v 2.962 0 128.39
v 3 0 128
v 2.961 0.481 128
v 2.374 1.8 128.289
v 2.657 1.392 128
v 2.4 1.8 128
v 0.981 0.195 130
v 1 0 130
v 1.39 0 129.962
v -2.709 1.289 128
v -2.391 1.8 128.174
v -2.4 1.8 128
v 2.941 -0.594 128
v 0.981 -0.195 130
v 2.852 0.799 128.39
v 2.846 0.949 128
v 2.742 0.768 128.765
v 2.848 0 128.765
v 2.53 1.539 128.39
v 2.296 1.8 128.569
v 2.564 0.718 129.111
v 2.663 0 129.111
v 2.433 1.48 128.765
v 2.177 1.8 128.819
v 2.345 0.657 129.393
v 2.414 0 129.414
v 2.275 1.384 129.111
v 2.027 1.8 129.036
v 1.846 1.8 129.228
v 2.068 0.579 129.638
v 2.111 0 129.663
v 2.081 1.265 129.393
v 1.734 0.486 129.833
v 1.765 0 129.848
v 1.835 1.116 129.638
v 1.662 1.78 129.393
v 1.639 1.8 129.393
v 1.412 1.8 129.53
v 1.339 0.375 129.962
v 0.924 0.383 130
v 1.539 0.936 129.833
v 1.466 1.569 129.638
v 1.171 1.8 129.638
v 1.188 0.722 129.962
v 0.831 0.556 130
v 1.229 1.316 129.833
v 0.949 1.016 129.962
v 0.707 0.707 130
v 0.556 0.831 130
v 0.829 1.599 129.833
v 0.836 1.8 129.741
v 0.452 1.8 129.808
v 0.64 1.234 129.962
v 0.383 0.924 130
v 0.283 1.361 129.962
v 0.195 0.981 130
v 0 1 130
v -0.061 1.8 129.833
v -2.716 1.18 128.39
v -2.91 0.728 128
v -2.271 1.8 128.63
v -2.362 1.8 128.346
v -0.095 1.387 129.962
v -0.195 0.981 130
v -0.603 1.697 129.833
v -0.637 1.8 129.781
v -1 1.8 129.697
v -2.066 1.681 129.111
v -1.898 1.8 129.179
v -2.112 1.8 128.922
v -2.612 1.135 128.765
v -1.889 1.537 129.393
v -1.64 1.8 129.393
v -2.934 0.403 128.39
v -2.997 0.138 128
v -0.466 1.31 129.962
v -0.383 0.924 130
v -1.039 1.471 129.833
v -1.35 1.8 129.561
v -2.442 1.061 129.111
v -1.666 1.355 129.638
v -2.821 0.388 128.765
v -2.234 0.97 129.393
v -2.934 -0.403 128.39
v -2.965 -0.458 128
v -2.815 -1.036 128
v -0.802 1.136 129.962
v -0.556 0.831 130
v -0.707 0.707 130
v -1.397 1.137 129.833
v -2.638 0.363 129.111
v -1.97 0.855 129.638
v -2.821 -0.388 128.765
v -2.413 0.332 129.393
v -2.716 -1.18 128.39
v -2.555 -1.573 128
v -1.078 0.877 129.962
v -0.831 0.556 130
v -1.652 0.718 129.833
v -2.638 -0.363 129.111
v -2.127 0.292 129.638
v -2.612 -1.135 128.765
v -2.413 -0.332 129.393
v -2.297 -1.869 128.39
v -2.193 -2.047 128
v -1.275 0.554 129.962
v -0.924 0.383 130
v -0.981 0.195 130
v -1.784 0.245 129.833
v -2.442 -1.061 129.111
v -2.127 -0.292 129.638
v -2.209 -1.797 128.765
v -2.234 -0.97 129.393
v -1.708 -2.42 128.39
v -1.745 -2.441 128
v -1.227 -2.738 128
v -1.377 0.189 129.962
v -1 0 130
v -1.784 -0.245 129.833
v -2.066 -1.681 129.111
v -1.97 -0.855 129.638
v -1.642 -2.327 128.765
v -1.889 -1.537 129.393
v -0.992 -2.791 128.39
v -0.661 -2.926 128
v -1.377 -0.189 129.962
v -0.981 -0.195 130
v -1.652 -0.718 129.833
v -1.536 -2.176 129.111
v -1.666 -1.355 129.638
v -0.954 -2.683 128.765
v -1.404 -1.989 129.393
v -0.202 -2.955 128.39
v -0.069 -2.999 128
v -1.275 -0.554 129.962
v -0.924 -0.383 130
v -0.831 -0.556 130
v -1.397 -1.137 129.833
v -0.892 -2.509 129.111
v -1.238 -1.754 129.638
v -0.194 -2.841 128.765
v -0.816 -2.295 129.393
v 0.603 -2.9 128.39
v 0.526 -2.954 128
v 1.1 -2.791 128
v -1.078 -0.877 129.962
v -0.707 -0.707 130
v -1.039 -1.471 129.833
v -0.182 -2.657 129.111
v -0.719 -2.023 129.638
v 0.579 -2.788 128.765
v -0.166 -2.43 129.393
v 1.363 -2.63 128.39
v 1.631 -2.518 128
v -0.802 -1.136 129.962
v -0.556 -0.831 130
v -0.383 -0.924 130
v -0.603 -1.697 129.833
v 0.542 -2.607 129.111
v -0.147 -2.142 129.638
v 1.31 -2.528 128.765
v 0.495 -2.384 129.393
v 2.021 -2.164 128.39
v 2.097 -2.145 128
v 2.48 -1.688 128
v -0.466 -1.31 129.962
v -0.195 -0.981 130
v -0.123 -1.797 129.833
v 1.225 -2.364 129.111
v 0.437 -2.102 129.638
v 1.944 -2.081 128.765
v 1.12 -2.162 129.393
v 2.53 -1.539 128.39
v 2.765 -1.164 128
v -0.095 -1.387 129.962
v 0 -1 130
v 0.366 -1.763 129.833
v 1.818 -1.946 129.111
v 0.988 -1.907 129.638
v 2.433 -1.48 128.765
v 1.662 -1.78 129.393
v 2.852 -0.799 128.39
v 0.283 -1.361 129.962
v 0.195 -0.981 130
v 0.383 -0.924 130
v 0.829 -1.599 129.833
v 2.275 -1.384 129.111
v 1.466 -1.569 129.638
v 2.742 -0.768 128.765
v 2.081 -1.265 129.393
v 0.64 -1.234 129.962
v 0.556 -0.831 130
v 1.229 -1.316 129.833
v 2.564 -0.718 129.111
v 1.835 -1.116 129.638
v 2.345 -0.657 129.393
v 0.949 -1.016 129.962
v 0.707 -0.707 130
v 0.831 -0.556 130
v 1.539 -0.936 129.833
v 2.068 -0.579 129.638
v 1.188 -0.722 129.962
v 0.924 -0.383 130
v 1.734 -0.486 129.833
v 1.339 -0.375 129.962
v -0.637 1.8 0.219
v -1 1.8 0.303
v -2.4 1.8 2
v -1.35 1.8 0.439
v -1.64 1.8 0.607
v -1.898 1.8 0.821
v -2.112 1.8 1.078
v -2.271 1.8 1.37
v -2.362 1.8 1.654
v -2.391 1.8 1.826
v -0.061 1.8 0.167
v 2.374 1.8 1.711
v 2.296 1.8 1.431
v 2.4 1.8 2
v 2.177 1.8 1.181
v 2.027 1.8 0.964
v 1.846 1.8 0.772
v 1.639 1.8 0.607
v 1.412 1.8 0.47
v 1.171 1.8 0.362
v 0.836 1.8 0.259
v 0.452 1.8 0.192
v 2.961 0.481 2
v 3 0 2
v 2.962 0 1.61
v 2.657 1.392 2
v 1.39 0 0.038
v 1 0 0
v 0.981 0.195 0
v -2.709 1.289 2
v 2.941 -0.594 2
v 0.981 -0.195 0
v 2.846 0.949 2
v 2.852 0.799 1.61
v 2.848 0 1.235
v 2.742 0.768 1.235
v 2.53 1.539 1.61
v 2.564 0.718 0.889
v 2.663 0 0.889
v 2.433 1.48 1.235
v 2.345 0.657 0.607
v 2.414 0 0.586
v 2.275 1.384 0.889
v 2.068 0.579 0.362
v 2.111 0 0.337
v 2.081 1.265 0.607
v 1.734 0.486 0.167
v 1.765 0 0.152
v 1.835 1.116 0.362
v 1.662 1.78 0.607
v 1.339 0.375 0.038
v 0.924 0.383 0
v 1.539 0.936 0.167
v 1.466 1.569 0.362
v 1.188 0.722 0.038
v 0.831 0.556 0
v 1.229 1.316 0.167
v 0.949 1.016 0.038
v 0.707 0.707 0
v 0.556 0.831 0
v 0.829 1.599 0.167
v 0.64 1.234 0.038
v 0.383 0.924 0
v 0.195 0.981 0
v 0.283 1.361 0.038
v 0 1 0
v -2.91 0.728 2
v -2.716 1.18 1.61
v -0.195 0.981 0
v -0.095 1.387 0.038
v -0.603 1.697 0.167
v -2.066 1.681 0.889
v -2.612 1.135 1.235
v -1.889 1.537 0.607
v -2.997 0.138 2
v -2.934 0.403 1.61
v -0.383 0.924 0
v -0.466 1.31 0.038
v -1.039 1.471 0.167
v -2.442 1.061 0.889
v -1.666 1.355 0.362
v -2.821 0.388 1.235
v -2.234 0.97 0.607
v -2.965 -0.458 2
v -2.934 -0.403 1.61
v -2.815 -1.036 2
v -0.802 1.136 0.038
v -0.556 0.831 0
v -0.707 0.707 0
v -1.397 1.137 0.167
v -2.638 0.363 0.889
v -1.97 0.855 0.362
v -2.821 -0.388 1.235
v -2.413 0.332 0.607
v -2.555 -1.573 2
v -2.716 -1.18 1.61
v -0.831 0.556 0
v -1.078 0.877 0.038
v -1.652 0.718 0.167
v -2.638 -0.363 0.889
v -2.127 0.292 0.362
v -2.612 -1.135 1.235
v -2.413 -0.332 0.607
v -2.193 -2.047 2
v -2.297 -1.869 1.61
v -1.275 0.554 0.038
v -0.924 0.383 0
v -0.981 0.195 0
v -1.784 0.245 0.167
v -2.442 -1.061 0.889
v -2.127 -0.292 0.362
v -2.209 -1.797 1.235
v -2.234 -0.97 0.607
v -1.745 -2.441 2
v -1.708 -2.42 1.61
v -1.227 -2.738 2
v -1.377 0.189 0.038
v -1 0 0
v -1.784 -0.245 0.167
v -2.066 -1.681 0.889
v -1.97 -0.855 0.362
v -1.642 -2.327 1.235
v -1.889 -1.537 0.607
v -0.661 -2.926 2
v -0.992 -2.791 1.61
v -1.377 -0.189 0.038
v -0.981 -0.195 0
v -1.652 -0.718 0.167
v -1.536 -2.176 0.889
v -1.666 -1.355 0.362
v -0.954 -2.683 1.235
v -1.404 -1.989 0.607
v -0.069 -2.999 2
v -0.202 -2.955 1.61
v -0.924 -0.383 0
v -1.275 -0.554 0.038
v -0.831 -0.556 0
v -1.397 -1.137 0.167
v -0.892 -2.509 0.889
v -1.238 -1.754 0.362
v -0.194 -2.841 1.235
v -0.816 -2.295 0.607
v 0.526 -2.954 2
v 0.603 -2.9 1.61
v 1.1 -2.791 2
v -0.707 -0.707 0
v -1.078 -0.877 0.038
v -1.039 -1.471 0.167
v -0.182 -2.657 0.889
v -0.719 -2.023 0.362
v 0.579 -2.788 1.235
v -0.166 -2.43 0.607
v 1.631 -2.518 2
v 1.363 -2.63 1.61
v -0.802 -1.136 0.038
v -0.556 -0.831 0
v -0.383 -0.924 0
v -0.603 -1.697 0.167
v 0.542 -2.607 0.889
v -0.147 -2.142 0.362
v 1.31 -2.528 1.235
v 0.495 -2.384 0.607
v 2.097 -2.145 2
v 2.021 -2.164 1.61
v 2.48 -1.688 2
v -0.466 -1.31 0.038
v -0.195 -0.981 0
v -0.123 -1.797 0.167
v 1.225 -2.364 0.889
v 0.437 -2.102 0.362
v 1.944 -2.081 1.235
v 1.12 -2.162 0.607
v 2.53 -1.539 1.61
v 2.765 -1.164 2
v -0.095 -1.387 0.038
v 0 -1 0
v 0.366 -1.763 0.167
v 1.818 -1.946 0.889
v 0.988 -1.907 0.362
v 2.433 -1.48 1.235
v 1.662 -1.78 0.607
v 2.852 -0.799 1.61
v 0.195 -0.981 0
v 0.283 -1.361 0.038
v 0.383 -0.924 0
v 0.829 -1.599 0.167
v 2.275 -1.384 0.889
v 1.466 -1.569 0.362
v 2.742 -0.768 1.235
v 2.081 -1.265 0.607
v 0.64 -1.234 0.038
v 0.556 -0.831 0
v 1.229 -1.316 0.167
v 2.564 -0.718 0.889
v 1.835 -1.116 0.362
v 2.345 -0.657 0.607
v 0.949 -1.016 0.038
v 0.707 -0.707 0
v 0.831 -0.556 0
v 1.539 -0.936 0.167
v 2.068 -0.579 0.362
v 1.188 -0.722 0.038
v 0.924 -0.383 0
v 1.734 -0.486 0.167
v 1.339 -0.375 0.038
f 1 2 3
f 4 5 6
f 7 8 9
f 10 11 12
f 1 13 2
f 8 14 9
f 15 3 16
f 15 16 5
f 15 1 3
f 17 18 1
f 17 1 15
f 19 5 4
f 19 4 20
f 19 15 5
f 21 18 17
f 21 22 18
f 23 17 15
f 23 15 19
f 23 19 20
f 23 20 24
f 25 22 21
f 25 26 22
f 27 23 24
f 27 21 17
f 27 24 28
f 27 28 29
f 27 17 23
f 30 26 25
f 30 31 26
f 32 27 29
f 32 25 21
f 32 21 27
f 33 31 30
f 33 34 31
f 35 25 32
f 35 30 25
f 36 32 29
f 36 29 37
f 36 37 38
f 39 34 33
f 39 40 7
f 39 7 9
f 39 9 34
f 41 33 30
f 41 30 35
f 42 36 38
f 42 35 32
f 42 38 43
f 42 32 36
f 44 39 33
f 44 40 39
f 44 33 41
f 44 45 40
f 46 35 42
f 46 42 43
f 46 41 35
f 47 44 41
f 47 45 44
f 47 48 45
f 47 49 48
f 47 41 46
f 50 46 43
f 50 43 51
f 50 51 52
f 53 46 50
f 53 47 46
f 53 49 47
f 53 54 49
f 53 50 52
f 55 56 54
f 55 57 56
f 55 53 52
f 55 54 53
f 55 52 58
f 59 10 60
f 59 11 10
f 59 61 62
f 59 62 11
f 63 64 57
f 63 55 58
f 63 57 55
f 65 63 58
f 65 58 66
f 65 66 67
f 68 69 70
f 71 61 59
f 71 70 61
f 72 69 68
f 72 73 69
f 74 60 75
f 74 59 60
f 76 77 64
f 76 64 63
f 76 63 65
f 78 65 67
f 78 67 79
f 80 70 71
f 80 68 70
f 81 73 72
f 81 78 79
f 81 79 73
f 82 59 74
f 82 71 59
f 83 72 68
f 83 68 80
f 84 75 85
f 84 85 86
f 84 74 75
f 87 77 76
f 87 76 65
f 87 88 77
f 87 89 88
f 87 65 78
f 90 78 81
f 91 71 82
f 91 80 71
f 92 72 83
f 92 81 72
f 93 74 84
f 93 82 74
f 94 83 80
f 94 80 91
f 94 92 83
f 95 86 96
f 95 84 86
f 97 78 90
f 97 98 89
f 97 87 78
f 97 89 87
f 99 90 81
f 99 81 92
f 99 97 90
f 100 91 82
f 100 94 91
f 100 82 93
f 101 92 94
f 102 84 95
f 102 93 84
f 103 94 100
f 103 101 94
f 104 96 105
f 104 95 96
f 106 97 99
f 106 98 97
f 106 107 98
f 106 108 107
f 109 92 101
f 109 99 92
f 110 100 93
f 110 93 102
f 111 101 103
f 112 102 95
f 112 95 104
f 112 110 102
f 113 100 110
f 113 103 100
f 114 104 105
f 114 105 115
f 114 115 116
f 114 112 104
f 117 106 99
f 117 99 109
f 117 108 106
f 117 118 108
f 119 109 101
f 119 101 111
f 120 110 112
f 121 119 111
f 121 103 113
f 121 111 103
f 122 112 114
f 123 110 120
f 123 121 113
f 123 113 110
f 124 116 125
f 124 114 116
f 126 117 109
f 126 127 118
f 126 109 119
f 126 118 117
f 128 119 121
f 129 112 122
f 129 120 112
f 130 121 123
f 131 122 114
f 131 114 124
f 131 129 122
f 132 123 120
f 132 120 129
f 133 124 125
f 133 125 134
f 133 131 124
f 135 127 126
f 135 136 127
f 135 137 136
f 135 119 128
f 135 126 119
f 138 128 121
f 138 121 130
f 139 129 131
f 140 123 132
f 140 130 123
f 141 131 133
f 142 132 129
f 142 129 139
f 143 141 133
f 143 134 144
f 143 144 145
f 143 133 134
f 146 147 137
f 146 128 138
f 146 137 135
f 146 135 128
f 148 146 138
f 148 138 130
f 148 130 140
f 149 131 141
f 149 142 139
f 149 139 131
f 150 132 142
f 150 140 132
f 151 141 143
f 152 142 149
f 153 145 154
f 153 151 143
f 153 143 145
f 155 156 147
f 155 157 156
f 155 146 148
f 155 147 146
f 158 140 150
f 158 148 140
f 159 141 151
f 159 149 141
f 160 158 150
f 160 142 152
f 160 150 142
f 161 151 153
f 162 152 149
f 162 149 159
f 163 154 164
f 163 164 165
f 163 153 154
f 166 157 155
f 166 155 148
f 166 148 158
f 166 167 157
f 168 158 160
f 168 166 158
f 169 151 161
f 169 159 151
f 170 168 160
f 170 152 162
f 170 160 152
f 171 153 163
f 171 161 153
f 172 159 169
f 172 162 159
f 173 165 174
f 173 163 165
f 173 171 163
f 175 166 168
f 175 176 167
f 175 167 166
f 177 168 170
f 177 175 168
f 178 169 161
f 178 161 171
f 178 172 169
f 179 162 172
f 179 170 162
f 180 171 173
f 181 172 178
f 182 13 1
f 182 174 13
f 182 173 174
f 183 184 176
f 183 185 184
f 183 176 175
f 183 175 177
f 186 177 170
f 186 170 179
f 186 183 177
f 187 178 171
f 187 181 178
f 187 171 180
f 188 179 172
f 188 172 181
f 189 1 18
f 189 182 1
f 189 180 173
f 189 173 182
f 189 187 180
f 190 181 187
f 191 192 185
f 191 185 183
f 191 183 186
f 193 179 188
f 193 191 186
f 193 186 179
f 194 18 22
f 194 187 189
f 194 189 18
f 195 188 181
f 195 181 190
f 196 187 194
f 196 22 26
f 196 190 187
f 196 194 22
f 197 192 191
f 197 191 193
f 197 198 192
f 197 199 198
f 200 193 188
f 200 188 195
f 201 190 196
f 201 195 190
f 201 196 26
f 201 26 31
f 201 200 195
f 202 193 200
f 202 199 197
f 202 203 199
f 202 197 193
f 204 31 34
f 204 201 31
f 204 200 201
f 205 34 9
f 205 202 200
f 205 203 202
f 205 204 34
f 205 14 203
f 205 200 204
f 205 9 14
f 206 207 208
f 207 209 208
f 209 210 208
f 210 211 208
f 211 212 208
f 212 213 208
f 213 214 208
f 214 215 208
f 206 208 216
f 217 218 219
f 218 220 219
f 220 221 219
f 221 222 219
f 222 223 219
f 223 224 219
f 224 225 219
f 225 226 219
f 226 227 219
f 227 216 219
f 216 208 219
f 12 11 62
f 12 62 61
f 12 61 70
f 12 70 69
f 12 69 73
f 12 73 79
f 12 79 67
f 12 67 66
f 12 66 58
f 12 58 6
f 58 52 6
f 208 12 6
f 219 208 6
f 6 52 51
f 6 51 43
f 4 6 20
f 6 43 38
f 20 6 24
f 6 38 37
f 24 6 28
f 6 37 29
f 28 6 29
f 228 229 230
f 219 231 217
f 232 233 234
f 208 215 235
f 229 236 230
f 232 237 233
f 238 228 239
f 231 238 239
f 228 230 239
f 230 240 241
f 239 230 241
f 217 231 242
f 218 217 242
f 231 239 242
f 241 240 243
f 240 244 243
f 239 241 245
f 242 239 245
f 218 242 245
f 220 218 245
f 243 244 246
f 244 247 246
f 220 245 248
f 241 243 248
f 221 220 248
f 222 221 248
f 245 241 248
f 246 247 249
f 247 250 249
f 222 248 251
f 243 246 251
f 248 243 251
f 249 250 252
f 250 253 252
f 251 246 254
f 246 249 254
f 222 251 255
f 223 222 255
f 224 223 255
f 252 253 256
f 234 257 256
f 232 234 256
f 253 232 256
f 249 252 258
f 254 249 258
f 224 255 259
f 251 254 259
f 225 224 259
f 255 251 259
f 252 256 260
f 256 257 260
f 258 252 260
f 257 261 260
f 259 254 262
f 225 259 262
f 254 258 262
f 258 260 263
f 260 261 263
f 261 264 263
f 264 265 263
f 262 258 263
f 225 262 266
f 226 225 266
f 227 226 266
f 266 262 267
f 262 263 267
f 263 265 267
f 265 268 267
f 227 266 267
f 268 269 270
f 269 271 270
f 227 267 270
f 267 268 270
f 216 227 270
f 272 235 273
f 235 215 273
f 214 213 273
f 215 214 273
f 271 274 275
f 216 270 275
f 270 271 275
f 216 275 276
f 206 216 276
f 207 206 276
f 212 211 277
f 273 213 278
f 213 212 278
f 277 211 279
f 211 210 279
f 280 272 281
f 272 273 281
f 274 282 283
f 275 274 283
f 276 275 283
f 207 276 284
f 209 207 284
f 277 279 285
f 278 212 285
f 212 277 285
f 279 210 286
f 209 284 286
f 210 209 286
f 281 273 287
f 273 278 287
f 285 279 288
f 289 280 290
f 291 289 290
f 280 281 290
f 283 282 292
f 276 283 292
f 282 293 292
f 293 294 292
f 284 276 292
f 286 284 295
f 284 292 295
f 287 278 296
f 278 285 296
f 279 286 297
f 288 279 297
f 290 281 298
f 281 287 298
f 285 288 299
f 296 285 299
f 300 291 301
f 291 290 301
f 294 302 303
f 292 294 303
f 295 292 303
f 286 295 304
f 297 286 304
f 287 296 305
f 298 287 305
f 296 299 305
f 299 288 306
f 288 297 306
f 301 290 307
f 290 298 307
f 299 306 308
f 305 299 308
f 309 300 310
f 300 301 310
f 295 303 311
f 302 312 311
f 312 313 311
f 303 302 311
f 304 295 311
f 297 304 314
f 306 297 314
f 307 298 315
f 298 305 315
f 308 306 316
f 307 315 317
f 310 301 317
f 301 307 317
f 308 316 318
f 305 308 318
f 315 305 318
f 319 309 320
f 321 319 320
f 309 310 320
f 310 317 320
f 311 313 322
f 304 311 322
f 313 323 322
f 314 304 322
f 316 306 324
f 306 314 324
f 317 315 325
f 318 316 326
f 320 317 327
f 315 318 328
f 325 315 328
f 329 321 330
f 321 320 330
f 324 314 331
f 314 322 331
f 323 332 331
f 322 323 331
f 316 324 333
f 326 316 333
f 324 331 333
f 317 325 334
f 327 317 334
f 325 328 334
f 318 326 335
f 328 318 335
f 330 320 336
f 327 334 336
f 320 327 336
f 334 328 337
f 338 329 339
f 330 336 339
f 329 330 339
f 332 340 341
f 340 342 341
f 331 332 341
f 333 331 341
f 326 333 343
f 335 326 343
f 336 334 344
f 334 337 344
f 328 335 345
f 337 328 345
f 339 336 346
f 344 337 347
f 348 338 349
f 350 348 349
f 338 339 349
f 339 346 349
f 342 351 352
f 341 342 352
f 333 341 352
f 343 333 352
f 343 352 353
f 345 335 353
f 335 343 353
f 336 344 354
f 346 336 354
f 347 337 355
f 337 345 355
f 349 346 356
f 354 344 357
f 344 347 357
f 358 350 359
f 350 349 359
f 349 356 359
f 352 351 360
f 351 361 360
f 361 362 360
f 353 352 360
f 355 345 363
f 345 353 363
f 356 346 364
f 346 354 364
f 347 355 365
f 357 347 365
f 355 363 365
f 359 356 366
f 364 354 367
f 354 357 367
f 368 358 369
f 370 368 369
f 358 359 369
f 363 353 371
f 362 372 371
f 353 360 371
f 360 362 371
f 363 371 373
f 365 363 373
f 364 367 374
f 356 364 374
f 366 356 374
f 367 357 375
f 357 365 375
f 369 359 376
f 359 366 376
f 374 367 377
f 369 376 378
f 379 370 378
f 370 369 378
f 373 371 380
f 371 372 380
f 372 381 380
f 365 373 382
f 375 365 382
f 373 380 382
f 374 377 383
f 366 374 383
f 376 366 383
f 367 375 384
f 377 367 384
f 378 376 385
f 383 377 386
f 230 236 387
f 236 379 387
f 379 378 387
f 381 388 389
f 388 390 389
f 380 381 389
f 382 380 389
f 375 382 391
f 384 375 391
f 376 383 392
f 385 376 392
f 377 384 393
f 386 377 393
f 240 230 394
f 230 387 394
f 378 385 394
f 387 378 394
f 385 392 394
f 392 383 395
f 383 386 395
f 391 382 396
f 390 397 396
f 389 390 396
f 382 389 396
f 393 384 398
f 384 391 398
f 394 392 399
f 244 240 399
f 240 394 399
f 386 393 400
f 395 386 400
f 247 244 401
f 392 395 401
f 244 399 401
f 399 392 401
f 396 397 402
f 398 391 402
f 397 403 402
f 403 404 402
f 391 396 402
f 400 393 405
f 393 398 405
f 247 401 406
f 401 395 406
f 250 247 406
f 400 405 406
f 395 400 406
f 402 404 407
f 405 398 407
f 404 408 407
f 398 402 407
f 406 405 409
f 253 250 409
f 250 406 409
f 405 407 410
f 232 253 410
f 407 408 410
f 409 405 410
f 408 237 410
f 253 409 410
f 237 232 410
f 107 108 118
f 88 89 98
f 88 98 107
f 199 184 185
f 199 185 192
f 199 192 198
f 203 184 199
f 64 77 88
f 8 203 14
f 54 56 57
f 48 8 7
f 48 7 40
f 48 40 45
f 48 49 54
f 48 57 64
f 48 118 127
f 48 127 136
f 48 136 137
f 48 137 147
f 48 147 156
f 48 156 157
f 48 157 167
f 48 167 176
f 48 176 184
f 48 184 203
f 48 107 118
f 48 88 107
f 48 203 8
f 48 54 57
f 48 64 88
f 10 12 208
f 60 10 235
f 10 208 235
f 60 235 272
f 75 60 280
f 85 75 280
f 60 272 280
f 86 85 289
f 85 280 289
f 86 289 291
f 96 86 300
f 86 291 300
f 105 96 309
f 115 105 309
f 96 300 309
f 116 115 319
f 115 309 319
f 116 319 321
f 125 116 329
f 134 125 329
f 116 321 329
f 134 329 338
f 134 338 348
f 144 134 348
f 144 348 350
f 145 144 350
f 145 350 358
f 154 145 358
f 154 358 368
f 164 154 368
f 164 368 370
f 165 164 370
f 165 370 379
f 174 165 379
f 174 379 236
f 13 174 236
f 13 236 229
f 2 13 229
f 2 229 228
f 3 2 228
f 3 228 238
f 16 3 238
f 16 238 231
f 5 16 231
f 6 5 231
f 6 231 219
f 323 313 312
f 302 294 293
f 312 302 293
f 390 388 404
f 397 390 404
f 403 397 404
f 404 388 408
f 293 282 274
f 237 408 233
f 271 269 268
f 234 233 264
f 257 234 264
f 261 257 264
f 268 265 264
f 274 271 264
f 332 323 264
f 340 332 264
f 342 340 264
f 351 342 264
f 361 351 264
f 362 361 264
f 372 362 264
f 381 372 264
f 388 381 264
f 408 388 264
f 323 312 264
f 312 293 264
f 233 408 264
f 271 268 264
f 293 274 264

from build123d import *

# Parameters (mm, degrees)
ESQUISSE1_R             = 3
BOSS_EXTRU_1_DEPTH      = 130
CONG_1_R                = 2
ESQUISSE2_W             = 6
ESQUISSE2_H             = 1.2
ENL_V_MAT_EXTRU_1_DEPTH = 131.069212347


with BuildPart() as part:
    # Esquisse1 → Boss.-Extru.1 (new body)
    with BuildSketch(Plane.XY):
        Circle(ESQUISSE1_R)
    extrude(amount=BOSS_EXTRU_1_DEPTH)

    # Congé1
    cong_1_edges = [part.edges().sort_by_distance(p)[0] for p in [
        (-3, 0, 0),
        (-3, 0, 130),
    ]]
    fillet(cong_1_edges, radius=CONG_1_R)

    # Esquisse2 → Enlèv. mat.-Extru.1 (cut, through all)
    with BuildSketch(Plane.XY.offset(130)):
        with Locations((0, 2.4)):
            Rectangle(ESQUISSE2_W, ESQUISSE2_H)
    extrude(amount=-ENL_V_MAT_EXTRU_1_DEPTH, mode=Mode.SUBTRACT)


solid = part.part
